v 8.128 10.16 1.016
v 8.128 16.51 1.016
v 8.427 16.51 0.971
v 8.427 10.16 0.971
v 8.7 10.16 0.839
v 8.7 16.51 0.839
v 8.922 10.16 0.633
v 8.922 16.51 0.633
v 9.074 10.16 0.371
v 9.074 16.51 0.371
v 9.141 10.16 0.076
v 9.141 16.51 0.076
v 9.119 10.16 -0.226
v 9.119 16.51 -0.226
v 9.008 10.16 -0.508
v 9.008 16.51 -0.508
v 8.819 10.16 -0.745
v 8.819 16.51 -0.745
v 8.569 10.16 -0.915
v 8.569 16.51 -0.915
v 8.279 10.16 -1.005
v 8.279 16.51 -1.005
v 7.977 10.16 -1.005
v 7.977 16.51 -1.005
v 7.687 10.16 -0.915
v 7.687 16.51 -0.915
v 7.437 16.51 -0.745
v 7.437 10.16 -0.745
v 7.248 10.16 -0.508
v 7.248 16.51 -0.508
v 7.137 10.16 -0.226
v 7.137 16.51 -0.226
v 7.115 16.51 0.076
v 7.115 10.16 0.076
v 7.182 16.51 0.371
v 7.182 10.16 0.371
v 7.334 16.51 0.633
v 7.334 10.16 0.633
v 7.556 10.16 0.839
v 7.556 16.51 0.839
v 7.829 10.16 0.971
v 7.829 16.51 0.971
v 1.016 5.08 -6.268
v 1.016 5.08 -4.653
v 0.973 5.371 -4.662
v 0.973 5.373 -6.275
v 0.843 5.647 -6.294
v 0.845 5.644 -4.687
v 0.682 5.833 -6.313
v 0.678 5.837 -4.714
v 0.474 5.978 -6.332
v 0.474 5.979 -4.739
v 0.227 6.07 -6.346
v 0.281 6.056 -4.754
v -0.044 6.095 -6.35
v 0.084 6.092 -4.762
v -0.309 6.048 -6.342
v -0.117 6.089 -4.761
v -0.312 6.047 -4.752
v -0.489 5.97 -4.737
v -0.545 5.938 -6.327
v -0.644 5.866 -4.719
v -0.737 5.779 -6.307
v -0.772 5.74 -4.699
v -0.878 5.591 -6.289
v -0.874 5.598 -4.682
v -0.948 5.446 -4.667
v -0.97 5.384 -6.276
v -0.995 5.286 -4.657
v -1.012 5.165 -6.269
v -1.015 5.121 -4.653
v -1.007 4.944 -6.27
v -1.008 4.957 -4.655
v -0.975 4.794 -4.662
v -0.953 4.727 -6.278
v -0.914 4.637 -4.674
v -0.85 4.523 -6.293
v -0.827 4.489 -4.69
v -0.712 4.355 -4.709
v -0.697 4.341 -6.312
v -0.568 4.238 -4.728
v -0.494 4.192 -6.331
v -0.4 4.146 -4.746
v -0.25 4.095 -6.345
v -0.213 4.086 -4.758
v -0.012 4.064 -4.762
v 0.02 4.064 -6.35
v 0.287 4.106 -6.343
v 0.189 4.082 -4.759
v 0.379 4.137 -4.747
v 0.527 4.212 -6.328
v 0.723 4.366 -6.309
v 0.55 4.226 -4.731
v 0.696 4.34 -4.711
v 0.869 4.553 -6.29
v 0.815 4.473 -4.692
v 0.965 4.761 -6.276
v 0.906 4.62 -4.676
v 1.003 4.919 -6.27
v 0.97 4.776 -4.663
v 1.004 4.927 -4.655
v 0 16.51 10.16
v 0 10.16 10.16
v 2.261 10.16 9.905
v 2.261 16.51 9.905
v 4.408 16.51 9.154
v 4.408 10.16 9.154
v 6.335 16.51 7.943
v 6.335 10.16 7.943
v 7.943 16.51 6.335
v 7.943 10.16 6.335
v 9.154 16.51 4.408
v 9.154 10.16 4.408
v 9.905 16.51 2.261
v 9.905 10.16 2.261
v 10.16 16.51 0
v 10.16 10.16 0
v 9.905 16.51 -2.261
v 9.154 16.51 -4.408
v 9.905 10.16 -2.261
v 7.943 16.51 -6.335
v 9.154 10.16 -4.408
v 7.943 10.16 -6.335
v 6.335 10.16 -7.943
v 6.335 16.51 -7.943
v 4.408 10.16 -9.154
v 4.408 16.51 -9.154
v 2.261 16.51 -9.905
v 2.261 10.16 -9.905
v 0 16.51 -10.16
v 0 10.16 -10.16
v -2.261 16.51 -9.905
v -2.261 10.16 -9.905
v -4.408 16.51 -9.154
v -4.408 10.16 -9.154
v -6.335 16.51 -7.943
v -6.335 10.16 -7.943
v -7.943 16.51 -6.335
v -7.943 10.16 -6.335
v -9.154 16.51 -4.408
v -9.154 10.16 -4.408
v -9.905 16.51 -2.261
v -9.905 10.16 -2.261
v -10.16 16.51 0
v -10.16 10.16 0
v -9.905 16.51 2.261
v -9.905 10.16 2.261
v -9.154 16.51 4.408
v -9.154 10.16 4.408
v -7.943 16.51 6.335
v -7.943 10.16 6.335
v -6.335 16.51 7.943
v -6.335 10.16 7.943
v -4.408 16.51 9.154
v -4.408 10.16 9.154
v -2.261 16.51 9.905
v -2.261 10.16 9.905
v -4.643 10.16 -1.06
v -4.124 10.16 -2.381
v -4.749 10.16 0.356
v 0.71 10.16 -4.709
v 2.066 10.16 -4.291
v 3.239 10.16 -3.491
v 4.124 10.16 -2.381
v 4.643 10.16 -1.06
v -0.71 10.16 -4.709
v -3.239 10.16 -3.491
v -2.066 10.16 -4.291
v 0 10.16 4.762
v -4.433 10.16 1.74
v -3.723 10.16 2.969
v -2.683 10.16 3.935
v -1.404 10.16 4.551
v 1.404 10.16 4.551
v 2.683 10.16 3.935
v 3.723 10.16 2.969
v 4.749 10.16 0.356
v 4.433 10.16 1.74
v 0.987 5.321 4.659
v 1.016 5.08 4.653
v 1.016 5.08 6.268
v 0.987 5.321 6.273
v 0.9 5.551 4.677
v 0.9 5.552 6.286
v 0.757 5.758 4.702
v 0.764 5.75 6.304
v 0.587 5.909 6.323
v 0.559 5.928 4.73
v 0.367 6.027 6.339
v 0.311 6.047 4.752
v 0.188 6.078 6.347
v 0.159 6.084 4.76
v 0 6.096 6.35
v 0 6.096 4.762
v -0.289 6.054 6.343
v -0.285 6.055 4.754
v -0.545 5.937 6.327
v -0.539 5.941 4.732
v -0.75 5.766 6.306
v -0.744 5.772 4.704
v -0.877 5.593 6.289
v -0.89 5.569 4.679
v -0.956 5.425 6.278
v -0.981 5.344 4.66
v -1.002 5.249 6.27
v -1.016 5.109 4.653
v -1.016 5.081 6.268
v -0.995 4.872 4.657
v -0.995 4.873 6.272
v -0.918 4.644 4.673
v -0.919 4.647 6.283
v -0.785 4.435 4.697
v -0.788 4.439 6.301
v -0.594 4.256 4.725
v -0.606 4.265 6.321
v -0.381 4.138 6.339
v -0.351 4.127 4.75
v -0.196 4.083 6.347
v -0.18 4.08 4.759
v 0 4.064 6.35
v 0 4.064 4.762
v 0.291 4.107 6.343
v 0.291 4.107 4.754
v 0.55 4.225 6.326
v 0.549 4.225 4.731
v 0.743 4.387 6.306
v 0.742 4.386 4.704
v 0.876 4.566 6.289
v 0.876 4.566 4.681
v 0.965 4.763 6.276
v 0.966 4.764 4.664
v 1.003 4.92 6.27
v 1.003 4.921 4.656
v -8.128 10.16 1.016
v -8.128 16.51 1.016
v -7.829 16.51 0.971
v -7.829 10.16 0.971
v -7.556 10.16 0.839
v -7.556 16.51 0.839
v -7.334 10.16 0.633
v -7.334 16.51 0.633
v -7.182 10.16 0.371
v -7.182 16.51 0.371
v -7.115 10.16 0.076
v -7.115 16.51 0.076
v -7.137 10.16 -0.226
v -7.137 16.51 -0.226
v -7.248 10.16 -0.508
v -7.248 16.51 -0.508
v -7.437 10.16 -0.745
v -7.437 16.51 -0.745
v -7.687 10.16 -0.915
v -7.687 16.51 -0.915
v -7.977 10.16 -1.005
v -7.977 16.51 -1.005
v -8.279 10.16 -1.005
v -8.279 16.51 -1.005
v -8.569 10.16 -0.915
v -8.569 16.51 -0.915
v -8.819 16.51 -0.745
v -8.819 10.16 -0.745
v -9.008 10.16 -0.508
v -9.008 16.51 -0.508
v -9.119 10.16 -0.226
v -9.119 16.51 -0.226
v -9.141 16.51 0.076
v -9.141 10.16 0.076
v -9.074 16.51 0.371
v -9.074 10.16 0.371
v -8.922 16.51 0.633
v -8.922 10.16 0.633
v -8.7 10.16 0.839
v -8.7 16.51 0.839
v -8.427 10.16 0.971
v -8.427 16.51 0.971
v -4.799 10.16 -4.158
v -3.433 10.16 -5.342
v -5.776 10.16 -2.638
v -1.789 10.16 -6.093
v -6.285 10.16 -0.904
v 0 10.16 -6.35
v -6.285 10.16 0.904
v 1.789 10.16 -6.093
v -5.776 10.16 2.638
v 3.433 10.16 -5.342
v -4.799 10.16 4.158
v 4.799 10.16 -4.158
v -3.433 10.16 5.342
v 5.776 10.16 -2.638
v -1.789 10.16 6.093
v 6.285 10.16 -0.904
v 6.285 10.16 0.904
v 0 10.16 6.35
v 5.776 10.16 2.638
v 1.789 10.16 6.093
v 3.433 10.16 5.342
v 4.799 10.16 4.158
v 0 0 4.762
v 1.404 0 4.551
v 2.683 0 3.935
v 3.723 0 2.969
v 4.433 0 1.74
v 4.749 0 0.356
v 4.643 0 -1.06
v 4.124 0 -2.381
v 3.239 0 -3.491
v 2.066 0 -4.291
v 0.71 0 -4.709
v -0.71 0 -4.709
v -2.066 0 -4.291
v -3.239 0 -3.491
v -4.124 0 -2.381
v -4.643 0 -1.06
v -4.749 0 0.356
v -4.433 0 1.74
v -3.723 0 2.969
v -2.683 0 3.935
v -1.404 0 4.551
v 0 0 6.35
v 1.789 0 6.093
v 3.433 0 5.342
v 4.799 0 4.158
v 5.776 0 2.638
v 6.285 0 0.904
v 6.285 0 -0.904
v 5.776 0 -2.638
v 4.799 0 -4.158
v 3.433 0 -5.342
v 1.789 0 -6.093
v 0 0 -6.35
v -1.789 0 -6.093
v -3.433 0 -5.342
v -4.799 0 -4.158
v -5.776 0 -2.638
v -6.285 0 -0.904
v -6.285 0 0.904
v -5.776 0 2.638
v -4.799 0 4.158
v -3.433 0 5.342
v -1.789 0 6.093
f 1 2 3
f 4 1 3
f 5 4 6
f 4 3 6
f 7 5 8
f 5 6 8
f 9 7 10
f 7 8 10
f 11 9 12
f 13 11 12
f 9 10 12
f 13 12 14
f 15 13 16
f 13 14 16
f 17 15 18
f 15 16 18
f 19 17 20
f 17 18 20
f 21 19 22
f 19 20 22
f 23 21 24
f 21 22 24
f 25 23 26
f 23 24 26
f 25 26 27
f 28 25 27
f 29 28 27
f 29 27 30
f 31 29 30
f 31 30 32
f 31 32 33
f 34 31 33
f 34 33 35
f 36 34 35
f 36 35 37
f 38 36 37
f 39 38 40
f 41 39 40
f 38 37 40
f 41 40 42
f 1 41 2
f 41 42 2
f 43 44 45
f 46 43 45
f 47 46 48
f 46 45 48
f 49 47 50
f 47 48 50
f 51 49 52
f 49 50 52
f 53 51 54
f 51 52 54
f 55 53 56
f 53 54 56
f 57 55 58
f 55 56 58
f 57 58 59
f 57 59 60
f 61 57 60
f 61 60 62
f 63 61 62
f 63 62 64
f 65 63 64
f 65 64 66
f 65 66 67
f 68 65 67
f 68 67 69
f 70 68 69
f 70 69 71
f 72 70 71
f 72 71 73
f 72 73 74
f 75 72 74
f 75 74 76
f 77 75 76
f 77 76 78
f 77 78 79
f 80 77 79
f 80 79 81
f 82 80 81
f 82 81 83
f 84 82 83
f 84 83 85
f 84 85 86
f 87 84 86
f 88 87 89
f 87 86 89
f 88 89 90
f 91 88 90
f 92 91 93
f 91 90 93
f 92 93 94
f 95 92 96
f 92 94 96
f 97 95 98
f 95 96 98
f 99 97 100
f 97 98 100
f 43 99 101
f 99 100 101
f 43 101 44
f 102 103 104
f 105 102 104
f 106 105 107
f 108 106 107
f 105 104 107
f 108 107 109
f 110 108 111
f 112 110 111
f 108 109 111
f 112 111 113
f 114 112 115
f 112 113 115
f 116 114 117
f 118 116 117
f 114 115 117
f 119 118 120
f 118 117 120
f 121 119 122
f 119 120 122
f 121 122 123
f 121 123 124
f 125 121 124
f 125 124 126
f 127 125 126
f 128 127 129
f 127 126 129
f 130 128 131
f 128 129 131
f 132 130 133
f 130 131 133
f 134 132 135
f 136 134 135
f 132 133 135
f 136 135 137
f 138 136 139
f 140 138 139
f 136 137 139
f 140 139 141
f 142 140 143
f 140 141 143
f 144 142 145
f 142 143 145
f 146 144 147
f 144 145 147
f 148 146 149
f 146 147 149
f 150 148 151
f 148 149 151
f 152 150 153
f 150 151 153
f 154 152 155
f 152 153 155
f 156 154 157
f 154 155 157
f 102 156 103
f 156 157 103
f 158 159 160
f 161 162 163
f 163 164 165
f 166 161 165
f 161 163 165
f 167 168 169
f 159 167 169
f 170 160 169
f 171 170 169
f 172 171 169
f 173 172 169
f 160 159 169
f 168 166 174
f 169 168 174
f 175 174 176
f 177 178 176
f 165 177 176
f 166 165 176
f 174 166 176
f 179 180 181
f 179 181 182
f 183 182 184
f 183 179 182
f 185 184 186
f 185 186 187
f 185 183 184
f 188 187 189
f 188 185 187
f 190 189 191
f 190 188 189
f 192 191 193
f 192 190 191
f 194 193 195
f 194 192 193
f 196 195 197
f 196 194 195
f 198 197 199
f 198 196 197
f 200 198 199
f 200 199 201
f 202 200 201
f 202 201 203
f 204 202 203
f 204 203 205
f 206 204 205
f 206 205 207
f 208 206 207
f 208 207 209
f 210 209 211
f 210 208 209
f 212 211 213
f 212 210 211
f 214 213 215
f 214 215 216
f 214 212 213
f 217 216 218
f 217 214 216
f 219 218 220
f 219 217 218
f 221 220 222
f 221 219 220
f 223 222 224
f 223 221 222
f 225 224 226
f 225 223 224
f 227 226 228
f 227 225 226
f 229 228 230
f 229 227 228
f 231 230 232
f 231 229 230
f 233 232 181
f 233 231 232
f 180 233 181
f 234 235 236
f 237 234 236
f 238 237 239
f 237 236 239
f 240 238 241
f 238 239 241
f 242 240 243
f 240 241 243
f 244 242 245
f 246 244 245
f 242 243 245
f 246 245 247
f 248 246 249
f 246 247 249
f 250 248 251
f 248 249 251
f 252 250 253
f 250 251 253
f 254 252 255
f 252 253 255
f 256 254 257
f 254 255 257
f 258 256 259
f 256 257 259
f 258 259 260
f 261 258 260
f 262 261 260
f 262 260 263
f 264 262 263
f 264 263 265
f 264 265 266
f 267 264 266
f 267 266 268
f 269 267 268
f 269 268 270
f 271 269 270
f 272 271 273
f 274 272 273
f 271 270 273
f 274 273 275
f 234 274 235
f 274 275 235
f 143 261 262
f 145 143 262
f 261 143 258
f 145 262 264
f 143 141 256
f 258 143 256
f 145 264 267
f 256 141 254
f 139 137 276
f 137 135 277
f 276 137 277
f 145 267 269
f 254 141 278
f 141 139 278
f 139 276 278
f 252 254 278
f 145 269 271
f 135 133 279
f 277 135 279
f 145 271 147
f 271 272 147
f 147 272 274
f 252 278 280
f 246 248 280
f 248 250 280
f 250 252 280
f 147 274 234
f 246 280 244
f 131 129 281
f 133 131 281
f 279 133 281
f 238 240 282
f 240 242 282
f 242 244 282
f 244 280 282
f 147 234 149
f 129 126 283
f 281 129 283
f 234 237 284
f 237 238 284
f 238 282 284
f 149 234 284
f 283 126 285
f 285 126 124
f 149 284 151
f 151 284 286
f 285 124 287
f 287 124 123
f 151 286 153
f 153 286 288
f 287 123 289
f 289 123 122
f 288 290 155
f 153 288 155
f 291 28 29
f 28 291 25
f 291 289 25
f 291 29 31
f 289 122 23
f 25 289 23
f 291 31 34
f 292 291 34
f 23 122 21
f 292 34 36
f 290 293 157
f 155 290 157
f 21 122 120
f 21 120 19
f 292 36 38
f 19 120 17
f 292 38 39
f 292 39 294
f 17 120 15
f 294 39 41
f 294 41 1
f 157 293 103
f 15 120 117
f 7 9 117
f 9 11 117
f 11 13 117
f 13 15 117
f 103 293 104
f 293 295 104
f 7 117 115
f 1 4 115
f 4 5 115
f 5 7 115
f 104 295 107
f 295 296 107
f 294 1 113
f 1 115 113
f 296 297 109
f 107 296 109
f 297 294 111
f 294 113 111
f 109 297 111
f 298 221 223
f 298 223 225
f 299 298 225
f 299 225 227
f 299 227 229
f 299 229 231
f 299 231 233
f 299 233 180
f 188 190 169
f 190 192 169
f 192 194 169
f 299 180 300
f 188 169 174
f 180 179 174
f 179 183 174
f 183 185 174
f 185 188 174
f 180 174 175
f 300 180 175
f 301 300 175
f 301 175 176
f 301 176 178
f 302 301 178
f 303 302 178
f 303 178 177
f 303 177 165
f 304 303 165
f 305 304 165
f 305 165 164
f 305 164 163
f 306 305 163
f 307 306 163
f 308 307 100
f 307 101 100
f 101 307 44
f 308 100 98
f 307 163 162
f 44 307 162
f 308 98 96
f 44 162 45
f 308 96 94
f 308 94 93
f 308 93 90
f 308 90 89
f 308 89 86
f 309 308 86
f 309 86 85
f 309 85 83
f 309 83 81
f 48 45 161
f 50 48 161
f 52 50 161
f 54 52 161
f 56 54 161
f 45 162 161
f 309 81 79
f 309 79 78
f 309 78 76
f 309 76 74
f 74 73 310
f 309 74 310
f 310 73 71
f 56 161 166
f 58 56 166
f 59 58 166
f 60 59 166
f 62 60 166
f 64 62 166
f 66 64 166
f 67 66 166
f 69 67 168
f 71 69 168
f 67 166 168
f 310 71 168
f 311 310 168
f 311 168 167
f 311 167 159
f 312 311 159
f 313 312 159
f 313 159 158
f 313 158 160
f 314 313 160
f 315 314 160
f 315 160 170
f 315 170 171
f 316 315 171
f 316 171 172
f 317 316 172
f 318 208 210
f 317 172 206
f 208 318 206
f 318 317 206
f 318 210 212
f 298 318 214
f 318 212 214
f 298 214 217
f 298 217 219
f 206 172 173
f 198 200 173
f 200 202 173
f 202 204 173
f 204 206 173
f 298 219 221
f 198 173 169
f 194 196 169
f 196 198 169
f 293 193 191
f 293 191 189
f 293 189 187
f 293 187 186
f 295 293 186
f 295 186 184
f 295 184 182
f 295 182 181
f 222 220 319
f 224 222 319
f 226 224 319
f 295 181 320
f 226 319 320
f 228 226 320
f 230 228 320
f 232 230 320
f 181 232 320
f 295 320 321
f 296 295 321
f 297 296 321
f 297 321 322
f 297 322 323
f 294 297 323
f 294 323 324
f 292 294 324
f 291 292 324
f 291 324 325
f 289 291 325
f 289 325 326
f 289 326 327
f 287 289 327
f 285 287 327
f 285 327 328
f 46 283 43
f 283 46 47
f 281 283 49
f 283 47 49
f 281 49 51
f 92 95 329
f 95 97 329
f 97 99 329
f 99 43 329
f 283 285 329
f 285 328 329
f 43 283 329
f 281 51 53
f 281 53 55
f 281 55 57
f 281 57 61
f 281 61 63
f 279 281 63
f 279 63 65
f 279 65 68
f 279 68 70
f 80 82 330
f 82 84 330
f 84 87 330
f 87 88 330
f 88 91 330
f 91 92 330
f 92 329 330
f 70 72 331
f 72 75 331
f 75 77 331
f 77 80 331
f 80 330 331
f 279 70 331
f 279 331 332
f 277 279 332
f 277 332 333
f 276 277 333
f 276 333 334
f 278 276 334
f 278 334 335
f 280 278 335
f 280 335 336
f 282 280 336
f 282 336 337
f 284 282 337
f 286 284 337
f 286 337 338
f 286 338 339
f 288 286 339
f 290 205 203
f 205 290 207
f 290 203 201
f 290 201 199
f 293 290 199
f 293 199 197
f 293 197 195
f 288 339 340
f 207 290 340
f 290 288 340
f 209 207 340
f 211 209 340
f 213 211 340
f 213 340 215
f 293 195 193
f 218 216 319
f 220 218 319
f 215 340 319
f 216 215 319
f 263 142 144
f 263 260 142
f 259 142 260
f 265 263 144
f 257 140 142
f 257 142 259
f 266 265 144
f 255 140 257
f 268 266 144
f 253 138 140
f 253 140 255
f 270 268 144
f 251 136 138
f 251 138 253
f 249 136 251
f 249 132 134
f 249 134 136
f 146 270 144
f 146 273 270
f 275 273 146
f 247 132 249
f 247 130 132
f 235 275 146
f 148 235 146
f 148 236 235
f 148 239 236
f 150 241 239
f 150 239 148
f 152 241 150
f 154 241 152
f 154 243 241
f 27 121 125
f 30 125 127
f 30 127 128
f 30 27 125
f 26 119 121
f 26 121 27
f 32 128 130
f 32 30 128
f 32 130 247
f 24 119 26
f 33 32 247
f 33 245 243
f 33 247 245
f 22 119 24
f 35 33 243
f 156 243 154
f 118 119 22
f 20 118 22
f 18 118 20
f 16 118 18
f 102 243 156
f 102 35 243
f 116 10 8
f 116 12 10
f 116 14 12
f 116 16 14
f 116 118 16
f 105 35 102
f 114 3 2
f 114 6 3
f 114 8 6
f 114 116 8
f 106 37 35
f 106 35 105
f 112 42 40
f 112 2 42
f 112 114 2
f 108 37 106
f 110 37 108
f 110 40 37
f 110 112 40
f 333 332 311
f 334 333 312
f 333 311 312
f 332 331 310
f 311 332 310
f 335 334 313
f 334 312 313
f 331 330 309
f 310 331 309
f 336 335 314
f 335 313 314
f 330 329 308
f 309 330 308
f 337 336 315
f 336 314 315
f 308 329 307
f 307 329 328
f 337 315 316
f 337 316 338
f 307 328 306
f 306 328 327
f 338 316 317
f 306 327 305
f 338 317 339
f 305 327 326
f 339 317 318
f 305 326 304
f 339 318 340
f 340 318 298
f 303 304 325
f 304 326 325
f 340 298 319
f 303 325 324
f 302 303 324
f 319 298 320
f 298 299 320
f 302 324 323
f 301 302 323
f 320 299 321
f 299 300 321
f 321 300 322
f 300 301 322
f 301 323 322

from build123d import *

# Parameters (mm, degrees)
SKETCH1_R                           = 6.35
BOSS_EXTRUDE1_DEPTH                 = 10.16
SKETCH2_R                           = 4.7625
CUT_EXTRUDE2_DEPTH                  = 10.16
SKETCH3_R                           = 6.35
BOSS_EXTRUDE2_DEPTH                 = 6.35
CUT_EXTRUDE3_REACH                  = 20.794
CUT_EXTRUDE3_END_RADIUS             = 6.35
SKETCH4_R                           = 1.016
CUT_EXTRUDE3_DIRECTION_2_REACH      = 20.794
CUT_EXTRUDE3_DIRECTION_2_END_RADIUS = 6.35
BOSS_EXTRUDE3_START                 = -6.35
SKETCH5_R                           = 10.16
SKETCH5_R_2                         = 6.35
BOSS_EXTRUDE3_DEPTH                 = 6.35
SKETCH10_R                          = 1.016
CUT_EXTRUDE4_DEPTH                  = 6.35


with BuildPart() as part:
    # Sketch1 → Boss-Extrude1 (new body)
    with BuildSketch(Plane(origin=(0, 0, 0), x_dir=(1, 0, 0), z_dir=(0, 1, 0))):
        with Locations(Location((0, 0, 0), (0, 0, 270))):
            Circle(SKETCH1_R)
    extrude(amount=BOSS_EXTRUDE1_DEPTH)

    # Sketch2 → Cut-Extrude2 (cut)
    with BuildSketch(Plane(origin=(0, 10.16, 0), x_dir=(1, 0, 0), z_dir=(0, 1, 0))):
        with Locations(Location((0, 0, 0), (0, 0, 270))):
            Circle(SKETCH2_R)
    extrude(amount=-CUT_EXTRUDE2_DEPTH, mode=Mode.SUBTRACT)

    # Sketch3 → Boss-Extrude2 (add)
    with BuildSketch(Plane(origin=(0, 10.16, 0), x_dir=(1, 0, 0), z_dir=(0, 1, 0))):
        with Locations(Location((0, 0, 0), (0, 0, 270))):
            Circle(SKETCH3_R)
    extrude(amount=BOSS_EXTRUDE2_DEPTH)

    # Cut-Extrude3: up to this cylinder (the profile starts inside it)
    cut_extrude3_end = Plane(origin=(0, 5.08, 0), z_dir=(0, -1, 0)) * Cylinder(CUT_EXTRUDE3_END_RADIUS, 55.288, mode=Mode.PRIVATE)
    # Sketch4 → Cut-Extrude3 (cut, up to the surface)
    with BuildSketch(Plane.XY, mode=Mode.PRIVATE) as cut_extrude3_sk1:
        with Locations((0, 5.08)):
            Circle(SKETCH4_R)
    cut_extrude3_tool1 = extrude(cut_extrude3_sk1.sketch, amount=-CUT_EXTRUDE3_REACH, mode=Mode.PRIVATE) & cut_extrude3_end
    add(cut_extrude3_tool1.solids().sort_by_distance((0, 5.08, 0))[0], mode=Mode.SUBTRACT)

    # Cut-Extrude3 direction 2: up to this cylinder (the profile starts inside it)
    cut_extrude3_direction_2_end = Plane(origin=(0, 5.08, 0), z_dir=(0, -1, 0)) * Cylinder(CUT_EXTRUDE3_DIRECTION_2_END_RADIUS, 55.288, mode=Mode.PRIVATE)
    # Sketch4 → Cut-Extrude3 direction 2 (cut, up to the surface)
    with BuildSketch(Plane.XY, mode=Mode.PRIVATE) as cut_extrude3_direction_2_sk1:
        with Locations((0, 5.08)):
            Circle(SKETCH4_R)
    cut_extrude3_direction_2_tool1 = extrude(cut_extrude3_direction_2_sk1.sketch, amount=CUT_EXTRUDE3_DIRECTION_2_REACH, mode=Mode.PRIVATE) & cut_extrude3_direction_2_end
    add(cut_extrude3_direction_2_tool1.solids().sort_by_distance((0, 5.08, 0))[0], mode=Mode.SUBTRACT)

    # Sketch5 → Boss-Extrude3 (add)
    with BuildSketch(Plane(origin=(0, 16.51, 0), x_dir=(1, 0, 0), z_dir=(0, 1, 0)).offset(BOSS_EXTRUDE3_START)):
        with Locations(Location((0, 0, 0), (0, 0, 270))):
            Circle(SKETCH5_R)
        with Locations(Location((0, 0, 0), (0, 0, 270))):
            Circle(SKETCH5_R_2, mode=Mode.SUBTRACT)
    extrude(amount=BOSS_EXTRUDE3_DEPTH)

    # Sketch10 → Cut-Extrude4 (cut)
    with BuildSketch(Plane(origin=(0, 16.51, 0), x_dir=(1, 0, 0), z_dir=(0, 1, 0))):
        with Locations(Location((8.128, 0, 0), (0, 0, 270))):
            Circle(SKETCH10_R)
        with Locations(Location((-8.128, 0, 0), (0, 0, 270))):
            Circle(SKETCH10_R)
    extrude(amount=-CUT_EXTRUDE4_DEPTH, mode=Mode.SUBTRACT)


solid = part.part
